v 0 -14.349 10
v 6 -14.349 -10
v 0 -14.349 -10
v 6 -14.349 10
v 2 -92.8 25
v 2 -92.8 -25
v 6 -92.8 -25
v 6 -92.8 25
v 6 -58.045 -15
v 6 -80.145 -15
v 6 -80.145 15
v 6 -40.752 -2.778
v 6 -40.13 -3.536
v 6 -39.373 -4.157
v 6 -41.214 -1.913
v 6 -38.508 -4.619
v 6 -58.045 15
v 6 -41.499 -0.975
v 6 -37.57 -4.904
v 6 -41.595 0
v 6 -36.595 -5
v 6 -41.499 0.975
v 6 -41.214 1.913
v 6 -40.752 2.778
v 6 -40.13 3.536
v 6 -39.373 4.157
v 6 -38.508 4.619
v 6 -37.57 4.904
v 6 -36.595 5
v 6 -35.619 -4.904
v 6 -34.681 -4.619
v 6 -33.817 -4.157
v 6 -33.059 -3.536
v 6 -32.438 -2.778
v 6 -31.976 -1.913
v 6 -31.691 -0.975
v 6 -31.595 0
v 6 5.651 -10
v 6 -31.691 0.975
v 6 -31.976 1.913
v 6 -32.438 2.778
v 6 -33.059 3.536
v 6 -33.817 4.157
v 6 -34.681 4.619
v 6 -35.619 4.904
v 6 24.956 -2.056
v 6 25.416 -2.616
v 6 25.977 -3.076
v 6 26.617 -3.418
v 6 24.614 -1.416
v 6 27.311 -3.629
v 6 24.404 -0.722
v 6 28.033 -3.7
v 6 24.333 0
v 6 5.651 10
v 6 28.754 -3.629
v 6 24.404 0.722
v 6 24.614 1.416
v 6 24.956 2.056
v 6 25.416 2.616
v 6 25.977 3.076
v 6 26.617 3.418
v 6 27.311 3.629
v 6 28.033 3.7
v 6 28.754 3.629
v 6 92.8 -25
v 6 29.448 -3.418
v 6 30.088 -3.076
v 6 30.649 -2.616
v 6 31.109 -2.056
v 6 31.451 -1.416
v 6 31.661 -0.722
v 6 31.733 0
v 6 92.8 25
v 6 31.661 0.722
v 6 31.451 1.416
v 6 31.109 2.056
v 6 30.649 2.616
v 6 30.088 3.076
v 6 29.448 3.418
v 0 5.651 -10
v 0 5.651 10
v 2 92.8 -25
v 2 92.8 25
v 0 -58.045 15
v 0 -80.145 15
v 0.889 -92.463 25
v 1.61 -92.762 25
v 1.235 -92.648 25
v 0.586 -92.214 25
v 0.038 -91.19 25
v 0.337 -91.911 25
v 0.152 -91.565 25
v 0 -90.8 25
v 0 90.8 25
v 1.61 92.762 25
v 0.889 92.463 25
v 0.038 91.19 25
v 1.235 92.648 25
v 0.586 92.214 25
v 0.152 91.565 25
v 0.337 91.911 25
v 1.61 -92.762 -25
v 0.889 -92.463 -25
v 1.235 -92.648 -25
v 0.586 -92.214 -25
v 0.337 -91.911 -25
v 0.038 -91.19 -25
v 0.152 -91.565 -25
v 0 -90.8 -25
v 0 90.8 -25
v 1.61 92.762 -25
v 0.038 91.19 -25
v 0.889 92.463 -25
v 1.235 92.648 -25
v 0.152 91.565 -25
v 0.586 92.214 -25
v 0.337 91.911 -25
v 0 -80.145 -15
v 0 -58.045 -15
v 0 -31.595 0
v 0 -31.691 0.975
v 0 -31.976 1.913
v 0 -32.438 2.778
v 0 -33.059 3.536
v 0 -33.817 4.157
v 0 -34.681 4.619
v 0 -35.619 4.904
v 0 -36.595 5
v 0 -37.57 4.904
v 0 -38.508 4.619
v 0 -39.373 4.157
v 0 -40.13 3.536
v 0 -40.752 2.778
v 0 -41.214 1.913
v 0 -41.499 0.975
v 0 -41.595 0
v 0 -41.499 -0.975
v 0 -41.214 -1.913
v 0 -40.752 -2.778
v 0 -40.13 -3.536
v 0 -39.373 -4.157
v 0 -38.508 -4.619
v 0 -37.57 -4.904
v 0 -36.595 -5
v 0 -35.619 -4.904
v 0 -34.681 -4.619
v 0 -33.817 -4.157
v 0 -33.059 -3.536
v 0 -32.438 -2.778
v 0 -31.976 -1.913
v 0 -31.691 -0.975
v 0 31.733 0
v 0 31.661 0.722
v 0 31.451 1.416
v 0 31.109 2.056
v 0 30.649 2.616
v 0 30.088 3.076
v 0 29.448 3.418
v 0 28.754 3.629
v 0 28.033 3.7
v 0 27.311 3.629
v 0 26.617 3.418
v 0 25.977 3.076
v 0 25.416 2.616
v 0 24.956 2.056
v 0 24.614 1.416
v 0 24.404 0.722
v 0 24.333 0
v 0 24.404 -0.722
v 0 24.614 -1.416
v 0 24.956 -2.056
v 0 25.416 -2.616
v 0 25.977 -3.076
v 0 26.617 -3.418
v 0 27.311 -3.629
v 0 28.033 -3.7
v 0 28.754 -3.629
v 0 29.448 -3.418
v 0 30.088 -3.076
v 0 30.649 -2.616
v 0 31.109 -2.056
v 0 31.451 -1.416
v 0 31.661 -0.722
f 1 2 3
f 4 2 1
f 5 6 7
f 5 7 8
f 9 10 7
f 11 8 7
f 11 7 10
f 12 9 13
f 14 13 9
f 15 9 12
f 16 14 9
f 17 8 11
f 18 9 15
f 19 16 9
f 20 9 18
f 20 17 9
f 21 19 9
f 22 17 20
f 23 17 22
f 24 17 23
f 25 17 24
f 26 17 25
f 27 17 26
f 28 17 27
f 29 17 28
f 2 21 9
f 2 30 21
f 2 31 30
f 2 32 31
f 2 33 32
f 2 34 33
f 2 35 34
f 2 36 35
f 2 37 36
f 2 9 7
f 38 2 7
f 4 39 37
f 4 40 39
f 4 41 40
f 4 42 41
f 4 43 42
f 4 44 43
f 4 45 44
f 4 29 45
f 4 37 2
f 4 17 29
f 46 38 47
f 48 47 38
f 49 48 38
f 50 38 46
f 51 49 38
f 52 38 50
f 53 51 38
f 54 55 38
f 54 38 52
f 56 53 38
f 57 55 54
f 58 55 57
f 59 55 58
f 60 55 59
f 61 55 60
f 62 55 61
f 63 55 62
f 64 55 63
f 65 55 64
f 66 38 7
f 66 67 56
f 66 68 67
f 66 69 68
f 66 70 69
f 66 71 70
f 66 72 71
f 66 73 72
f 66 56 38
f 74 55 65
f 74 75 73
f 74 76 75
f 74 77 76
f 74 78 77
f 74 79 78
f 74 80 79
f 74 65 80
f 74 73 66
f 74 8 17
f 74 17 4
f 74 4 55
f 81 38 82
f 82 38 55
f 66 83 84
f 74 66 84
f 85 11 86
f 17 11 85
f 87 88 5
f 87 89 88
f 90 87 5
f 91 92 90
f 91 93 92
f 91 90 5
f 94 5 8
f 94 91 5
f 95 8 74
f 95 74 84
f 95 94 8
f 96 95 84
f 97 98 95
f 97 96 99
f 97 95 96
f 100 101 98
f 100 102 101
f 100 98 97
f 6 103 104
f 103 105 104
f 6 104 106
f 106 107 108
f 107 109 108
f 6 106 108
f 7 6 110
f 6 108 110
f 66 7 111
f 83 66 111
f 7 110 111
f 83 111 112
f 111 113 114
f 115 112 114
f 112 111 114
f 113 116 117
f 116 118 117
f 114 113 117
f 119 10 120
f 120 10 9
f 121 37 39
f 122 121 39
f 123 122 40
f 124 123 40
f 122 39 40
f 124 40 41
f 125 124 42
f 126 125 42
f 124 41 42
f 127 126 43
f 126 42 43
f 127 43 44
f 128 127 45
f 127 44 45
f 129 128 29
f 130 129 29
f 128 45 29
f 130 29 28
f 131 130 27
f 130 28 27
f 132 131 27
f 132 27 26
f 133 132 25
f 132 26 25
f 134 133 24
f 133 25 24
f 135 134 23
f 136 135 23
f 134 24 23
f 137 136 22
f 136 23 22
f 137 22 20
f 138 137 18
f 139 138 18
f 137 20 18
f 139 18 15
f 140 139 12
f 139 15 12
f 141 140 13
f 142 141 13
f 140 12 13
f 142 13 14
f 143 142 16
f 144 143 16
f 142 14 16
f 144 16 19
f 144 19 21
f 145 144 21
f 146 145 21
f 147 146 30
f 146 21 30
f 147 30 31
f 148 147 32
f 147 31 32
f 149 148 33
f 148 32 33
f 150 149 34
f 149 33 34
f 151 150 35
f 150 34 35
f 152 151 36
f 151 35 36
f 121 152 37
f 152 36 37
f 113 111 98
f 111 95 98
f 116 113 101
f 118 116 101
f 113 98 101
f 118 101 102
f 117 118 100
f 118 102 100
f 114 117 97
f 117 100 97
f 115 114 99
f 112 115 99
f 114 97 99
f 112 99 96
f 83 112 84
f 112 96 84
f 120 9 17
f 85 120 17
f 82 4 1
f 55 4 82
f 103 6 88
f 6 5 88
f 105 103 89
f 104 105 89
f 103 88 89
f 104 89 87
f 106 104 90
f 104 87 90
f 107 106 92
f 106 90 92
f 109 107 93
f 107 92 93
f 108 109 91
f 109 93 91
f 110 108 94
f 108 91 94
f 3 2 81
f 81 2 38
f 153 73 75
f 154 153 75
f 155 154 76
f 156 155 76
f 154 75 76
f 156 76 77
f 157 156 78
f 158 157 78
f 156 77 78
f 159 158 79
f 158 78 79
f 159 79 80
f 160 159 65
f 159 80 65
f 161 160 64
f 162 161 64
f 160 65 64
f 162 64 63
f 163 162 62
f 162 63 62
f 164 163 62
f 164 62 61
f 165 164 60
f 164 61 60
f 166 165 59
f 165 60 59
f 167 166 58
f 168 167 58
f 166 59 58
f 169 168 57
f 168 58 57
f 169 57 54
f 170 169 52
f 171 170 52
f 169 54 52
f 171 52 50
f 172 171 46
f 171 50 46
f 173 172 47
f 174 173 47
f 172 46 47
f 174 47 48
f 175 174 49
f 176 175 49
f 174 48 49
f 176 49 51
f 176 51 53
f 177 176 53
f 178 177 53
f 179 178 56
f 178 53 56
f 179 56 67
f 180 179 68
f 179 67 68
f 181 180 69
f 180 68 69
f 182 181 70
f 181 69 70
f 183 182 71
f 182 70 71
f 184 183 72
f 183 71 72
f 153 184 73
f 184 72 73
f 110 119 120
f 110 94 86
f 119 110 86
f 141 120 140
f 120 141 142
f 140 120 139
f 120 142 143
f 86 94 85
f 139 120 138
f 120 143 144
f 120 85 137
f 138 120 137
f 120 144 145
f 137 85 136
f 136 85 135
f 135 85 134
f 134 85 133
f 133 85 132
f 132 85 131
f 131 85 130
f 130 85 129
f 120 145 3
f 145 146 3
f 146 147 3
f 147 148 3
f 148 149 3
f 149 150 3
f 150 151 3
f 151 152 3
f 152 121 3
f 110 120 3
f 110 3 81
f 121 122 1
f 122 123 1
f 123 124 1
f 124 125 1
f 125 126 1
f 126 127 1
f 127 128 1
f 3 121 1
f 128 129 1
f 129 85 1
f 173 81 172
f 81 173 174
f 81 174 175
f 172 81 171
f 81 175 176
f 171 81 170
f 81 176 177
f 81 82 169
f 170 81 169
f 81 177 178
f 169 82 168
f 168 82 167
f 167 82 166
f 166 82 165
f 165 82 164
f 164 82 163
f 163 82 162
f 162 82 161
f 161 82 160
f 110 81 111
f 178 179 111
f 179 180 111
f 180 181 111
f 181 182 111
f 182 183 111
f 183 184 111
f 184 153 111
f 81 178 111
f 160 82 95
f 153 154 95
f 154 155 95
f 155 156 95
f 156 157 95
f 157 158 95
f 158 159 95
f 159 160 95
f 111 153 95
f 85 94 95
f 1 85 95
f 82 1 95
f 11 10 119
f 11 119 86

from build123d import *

# Parameters (mm, degrees)
F0_W     = 185.6
F0_H     = 50
F1_DEPTH = 6
F2_W     = 22.1
F2_H     = 30
F3_DEPTH = 6
F4_R     = 5
F5_DEPTH = 6
F6_W     = 20
F6_H     = 20
F7_DEPTH = 6
F8_R     = 3.7
F9_DEPTH = 6
F10_R    = 2


with BuildPart() as f1:
    # F0 (on Right) → F1 (new body)
    with BuildSketch(Plane.YZ):
        Rectangle(F0_W, F0_H)
    extrude(amount=F1_DEPTH)

    # F2 (on face) → F3 (cut, through all)
    with BuildSketch(Plane.YZ.offset(6)):
        with Locations((-69.095318, 0)):
            Rectangle(F2_W, F2_H)
    extrude(amount=-F3_DEPTH, mode=Mode.SUBTRACT)

    # F4 (on face) → F5 (cut, through all)
    with BuildSketch(Plane.YZ.offset(6)):
        with Locations((-36.594901, 0)):
            Circle(F4_R)
    extrude(amount=-F5_DEPTH, mode=Mode.SUBTRACT)

    # F6 (on face) → F7 (cut, through all)
    with BuildSketch(Plane.YZ.offset(6)):
        with Locations((-4.348571, 0)):
            Rectangle(F6_W, F6_H)
    extrude(amount=-F7_DEPTH, mode=Mode.SUBTRACT)

    # F8 (on face) → F9 (cut, through all)
    with BuildSketch(Plane.YZ.offset(6)):
        with Locations((28.03257, 0)):
            Circle(F8_R)
    extrude(amount=-F9_DEPTH, mode=Mode.SUBTRACT)

    # F10
    f10_edges = [f1.edges().sort_by_distance(p)[0] for p in [
        (0, 92.8, 0),
        (0, -92.8, 0),
    ]]
    fillet(f10_edges, radius=F10_R)


solid = f1.part
